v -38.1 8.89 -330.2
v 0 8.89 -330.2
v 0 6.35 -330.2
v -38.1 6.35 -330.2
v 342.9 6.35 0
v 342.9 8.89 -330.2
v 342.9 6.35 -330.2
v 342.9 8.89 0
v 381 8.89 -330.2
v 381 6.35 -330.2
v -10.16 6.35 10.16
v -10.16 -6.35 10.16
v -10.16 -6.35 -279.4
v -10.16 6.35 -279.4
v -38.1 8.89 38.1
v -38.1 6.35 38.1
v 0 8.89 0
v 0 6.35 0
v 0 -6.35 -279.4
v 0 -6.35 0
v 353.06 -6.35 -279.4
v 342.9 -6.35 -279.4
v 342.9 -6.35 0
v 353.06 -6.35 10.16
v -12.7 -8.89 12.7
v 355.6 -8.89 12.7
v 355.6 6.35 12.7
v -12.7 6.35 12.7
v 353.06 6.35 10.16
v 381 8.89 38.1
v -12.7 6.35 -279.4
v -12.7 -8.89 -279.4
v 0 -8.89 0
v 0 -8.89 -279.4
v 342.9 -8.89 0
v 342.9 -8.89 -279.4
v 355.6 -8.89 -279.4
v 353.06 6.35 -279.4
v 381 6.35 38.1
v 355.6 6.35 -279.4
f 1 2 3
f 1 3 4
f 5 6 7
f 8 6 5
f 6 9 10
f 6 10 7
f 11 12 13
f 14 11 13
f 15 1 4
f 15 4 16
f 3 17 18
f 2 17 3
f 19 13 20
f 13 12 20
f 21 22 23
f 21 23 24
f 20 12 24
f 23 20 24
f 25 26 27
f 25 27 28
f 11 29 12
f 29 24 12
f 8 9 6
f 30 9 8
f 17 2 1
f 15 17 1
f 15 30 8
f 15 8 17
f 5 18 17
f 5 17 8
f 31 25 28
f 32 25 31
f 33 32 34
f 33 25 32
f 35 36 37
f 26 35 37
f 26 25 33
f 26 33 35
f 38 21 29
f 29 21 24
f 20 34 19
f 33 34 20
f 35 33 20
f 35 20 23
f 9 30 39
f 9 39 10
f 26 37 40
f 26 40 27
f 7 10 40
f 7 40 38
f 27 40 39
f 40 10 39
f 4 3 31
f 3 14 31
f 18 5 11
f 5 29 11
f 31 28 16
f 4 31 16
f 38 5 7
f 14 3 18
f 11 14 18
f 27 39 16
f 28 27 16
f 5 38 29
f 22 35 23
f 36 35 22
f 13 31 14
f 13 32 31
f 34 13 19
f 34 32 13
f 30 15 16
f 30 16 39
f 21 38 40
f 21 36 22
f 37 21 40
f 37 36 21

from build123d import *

# Parameters (mm, degrees)
F1_DEPTH = 8.89
F2_T     = -2.54
F4_DEPTH = 2.54


with BuildPart() as f1:
    # F0 (on Front) → F1 (new body, symmetric)
    with BuildSketch(Plane.XZ):
        Polygon((-12.7, -279.4), (0, -279.4), (0, 0), (342.9, 0), (342.9, -279.4), (355.6, -279.4), (355.6, 12.7), (-12.7, 12.7), align=None)
    extrude(amount=F1_DEPTH, both=True)

    # F2
    f2_openings = [f1.faces().sort_by_distance(p)[0] for p in [
        (171.45, 0, 0),
        (0, 0, -139.7),
        (-6.35, 0, -279.4),
        (342.9, 0, -139.7),
        (349.25, 0, -279.4),
    ]]
    offset(amount=F2_T, openings=f2_openings)

    # F3 (on face) → F4 (join)
    with BuildSketch(Plane(origin=(0, 8.89, 0), x_dir=(-1, 0, 0), z_dir=(0, 1, 0))):
        Polygon((-381, 38.1), (-381, -330.2), (-342.9, -330.2), (-342.9, -279.4), (-355.6, -279.4), (-355.6, 12.7), (12.7, 12.7), (12.7, -279.4), (0, -279.4), (0, -330.2), (38.1, -330.2), (38.1, 38.1), align=None)
    extrude(amount=-F4_DEPTH)


solid = f1.part
